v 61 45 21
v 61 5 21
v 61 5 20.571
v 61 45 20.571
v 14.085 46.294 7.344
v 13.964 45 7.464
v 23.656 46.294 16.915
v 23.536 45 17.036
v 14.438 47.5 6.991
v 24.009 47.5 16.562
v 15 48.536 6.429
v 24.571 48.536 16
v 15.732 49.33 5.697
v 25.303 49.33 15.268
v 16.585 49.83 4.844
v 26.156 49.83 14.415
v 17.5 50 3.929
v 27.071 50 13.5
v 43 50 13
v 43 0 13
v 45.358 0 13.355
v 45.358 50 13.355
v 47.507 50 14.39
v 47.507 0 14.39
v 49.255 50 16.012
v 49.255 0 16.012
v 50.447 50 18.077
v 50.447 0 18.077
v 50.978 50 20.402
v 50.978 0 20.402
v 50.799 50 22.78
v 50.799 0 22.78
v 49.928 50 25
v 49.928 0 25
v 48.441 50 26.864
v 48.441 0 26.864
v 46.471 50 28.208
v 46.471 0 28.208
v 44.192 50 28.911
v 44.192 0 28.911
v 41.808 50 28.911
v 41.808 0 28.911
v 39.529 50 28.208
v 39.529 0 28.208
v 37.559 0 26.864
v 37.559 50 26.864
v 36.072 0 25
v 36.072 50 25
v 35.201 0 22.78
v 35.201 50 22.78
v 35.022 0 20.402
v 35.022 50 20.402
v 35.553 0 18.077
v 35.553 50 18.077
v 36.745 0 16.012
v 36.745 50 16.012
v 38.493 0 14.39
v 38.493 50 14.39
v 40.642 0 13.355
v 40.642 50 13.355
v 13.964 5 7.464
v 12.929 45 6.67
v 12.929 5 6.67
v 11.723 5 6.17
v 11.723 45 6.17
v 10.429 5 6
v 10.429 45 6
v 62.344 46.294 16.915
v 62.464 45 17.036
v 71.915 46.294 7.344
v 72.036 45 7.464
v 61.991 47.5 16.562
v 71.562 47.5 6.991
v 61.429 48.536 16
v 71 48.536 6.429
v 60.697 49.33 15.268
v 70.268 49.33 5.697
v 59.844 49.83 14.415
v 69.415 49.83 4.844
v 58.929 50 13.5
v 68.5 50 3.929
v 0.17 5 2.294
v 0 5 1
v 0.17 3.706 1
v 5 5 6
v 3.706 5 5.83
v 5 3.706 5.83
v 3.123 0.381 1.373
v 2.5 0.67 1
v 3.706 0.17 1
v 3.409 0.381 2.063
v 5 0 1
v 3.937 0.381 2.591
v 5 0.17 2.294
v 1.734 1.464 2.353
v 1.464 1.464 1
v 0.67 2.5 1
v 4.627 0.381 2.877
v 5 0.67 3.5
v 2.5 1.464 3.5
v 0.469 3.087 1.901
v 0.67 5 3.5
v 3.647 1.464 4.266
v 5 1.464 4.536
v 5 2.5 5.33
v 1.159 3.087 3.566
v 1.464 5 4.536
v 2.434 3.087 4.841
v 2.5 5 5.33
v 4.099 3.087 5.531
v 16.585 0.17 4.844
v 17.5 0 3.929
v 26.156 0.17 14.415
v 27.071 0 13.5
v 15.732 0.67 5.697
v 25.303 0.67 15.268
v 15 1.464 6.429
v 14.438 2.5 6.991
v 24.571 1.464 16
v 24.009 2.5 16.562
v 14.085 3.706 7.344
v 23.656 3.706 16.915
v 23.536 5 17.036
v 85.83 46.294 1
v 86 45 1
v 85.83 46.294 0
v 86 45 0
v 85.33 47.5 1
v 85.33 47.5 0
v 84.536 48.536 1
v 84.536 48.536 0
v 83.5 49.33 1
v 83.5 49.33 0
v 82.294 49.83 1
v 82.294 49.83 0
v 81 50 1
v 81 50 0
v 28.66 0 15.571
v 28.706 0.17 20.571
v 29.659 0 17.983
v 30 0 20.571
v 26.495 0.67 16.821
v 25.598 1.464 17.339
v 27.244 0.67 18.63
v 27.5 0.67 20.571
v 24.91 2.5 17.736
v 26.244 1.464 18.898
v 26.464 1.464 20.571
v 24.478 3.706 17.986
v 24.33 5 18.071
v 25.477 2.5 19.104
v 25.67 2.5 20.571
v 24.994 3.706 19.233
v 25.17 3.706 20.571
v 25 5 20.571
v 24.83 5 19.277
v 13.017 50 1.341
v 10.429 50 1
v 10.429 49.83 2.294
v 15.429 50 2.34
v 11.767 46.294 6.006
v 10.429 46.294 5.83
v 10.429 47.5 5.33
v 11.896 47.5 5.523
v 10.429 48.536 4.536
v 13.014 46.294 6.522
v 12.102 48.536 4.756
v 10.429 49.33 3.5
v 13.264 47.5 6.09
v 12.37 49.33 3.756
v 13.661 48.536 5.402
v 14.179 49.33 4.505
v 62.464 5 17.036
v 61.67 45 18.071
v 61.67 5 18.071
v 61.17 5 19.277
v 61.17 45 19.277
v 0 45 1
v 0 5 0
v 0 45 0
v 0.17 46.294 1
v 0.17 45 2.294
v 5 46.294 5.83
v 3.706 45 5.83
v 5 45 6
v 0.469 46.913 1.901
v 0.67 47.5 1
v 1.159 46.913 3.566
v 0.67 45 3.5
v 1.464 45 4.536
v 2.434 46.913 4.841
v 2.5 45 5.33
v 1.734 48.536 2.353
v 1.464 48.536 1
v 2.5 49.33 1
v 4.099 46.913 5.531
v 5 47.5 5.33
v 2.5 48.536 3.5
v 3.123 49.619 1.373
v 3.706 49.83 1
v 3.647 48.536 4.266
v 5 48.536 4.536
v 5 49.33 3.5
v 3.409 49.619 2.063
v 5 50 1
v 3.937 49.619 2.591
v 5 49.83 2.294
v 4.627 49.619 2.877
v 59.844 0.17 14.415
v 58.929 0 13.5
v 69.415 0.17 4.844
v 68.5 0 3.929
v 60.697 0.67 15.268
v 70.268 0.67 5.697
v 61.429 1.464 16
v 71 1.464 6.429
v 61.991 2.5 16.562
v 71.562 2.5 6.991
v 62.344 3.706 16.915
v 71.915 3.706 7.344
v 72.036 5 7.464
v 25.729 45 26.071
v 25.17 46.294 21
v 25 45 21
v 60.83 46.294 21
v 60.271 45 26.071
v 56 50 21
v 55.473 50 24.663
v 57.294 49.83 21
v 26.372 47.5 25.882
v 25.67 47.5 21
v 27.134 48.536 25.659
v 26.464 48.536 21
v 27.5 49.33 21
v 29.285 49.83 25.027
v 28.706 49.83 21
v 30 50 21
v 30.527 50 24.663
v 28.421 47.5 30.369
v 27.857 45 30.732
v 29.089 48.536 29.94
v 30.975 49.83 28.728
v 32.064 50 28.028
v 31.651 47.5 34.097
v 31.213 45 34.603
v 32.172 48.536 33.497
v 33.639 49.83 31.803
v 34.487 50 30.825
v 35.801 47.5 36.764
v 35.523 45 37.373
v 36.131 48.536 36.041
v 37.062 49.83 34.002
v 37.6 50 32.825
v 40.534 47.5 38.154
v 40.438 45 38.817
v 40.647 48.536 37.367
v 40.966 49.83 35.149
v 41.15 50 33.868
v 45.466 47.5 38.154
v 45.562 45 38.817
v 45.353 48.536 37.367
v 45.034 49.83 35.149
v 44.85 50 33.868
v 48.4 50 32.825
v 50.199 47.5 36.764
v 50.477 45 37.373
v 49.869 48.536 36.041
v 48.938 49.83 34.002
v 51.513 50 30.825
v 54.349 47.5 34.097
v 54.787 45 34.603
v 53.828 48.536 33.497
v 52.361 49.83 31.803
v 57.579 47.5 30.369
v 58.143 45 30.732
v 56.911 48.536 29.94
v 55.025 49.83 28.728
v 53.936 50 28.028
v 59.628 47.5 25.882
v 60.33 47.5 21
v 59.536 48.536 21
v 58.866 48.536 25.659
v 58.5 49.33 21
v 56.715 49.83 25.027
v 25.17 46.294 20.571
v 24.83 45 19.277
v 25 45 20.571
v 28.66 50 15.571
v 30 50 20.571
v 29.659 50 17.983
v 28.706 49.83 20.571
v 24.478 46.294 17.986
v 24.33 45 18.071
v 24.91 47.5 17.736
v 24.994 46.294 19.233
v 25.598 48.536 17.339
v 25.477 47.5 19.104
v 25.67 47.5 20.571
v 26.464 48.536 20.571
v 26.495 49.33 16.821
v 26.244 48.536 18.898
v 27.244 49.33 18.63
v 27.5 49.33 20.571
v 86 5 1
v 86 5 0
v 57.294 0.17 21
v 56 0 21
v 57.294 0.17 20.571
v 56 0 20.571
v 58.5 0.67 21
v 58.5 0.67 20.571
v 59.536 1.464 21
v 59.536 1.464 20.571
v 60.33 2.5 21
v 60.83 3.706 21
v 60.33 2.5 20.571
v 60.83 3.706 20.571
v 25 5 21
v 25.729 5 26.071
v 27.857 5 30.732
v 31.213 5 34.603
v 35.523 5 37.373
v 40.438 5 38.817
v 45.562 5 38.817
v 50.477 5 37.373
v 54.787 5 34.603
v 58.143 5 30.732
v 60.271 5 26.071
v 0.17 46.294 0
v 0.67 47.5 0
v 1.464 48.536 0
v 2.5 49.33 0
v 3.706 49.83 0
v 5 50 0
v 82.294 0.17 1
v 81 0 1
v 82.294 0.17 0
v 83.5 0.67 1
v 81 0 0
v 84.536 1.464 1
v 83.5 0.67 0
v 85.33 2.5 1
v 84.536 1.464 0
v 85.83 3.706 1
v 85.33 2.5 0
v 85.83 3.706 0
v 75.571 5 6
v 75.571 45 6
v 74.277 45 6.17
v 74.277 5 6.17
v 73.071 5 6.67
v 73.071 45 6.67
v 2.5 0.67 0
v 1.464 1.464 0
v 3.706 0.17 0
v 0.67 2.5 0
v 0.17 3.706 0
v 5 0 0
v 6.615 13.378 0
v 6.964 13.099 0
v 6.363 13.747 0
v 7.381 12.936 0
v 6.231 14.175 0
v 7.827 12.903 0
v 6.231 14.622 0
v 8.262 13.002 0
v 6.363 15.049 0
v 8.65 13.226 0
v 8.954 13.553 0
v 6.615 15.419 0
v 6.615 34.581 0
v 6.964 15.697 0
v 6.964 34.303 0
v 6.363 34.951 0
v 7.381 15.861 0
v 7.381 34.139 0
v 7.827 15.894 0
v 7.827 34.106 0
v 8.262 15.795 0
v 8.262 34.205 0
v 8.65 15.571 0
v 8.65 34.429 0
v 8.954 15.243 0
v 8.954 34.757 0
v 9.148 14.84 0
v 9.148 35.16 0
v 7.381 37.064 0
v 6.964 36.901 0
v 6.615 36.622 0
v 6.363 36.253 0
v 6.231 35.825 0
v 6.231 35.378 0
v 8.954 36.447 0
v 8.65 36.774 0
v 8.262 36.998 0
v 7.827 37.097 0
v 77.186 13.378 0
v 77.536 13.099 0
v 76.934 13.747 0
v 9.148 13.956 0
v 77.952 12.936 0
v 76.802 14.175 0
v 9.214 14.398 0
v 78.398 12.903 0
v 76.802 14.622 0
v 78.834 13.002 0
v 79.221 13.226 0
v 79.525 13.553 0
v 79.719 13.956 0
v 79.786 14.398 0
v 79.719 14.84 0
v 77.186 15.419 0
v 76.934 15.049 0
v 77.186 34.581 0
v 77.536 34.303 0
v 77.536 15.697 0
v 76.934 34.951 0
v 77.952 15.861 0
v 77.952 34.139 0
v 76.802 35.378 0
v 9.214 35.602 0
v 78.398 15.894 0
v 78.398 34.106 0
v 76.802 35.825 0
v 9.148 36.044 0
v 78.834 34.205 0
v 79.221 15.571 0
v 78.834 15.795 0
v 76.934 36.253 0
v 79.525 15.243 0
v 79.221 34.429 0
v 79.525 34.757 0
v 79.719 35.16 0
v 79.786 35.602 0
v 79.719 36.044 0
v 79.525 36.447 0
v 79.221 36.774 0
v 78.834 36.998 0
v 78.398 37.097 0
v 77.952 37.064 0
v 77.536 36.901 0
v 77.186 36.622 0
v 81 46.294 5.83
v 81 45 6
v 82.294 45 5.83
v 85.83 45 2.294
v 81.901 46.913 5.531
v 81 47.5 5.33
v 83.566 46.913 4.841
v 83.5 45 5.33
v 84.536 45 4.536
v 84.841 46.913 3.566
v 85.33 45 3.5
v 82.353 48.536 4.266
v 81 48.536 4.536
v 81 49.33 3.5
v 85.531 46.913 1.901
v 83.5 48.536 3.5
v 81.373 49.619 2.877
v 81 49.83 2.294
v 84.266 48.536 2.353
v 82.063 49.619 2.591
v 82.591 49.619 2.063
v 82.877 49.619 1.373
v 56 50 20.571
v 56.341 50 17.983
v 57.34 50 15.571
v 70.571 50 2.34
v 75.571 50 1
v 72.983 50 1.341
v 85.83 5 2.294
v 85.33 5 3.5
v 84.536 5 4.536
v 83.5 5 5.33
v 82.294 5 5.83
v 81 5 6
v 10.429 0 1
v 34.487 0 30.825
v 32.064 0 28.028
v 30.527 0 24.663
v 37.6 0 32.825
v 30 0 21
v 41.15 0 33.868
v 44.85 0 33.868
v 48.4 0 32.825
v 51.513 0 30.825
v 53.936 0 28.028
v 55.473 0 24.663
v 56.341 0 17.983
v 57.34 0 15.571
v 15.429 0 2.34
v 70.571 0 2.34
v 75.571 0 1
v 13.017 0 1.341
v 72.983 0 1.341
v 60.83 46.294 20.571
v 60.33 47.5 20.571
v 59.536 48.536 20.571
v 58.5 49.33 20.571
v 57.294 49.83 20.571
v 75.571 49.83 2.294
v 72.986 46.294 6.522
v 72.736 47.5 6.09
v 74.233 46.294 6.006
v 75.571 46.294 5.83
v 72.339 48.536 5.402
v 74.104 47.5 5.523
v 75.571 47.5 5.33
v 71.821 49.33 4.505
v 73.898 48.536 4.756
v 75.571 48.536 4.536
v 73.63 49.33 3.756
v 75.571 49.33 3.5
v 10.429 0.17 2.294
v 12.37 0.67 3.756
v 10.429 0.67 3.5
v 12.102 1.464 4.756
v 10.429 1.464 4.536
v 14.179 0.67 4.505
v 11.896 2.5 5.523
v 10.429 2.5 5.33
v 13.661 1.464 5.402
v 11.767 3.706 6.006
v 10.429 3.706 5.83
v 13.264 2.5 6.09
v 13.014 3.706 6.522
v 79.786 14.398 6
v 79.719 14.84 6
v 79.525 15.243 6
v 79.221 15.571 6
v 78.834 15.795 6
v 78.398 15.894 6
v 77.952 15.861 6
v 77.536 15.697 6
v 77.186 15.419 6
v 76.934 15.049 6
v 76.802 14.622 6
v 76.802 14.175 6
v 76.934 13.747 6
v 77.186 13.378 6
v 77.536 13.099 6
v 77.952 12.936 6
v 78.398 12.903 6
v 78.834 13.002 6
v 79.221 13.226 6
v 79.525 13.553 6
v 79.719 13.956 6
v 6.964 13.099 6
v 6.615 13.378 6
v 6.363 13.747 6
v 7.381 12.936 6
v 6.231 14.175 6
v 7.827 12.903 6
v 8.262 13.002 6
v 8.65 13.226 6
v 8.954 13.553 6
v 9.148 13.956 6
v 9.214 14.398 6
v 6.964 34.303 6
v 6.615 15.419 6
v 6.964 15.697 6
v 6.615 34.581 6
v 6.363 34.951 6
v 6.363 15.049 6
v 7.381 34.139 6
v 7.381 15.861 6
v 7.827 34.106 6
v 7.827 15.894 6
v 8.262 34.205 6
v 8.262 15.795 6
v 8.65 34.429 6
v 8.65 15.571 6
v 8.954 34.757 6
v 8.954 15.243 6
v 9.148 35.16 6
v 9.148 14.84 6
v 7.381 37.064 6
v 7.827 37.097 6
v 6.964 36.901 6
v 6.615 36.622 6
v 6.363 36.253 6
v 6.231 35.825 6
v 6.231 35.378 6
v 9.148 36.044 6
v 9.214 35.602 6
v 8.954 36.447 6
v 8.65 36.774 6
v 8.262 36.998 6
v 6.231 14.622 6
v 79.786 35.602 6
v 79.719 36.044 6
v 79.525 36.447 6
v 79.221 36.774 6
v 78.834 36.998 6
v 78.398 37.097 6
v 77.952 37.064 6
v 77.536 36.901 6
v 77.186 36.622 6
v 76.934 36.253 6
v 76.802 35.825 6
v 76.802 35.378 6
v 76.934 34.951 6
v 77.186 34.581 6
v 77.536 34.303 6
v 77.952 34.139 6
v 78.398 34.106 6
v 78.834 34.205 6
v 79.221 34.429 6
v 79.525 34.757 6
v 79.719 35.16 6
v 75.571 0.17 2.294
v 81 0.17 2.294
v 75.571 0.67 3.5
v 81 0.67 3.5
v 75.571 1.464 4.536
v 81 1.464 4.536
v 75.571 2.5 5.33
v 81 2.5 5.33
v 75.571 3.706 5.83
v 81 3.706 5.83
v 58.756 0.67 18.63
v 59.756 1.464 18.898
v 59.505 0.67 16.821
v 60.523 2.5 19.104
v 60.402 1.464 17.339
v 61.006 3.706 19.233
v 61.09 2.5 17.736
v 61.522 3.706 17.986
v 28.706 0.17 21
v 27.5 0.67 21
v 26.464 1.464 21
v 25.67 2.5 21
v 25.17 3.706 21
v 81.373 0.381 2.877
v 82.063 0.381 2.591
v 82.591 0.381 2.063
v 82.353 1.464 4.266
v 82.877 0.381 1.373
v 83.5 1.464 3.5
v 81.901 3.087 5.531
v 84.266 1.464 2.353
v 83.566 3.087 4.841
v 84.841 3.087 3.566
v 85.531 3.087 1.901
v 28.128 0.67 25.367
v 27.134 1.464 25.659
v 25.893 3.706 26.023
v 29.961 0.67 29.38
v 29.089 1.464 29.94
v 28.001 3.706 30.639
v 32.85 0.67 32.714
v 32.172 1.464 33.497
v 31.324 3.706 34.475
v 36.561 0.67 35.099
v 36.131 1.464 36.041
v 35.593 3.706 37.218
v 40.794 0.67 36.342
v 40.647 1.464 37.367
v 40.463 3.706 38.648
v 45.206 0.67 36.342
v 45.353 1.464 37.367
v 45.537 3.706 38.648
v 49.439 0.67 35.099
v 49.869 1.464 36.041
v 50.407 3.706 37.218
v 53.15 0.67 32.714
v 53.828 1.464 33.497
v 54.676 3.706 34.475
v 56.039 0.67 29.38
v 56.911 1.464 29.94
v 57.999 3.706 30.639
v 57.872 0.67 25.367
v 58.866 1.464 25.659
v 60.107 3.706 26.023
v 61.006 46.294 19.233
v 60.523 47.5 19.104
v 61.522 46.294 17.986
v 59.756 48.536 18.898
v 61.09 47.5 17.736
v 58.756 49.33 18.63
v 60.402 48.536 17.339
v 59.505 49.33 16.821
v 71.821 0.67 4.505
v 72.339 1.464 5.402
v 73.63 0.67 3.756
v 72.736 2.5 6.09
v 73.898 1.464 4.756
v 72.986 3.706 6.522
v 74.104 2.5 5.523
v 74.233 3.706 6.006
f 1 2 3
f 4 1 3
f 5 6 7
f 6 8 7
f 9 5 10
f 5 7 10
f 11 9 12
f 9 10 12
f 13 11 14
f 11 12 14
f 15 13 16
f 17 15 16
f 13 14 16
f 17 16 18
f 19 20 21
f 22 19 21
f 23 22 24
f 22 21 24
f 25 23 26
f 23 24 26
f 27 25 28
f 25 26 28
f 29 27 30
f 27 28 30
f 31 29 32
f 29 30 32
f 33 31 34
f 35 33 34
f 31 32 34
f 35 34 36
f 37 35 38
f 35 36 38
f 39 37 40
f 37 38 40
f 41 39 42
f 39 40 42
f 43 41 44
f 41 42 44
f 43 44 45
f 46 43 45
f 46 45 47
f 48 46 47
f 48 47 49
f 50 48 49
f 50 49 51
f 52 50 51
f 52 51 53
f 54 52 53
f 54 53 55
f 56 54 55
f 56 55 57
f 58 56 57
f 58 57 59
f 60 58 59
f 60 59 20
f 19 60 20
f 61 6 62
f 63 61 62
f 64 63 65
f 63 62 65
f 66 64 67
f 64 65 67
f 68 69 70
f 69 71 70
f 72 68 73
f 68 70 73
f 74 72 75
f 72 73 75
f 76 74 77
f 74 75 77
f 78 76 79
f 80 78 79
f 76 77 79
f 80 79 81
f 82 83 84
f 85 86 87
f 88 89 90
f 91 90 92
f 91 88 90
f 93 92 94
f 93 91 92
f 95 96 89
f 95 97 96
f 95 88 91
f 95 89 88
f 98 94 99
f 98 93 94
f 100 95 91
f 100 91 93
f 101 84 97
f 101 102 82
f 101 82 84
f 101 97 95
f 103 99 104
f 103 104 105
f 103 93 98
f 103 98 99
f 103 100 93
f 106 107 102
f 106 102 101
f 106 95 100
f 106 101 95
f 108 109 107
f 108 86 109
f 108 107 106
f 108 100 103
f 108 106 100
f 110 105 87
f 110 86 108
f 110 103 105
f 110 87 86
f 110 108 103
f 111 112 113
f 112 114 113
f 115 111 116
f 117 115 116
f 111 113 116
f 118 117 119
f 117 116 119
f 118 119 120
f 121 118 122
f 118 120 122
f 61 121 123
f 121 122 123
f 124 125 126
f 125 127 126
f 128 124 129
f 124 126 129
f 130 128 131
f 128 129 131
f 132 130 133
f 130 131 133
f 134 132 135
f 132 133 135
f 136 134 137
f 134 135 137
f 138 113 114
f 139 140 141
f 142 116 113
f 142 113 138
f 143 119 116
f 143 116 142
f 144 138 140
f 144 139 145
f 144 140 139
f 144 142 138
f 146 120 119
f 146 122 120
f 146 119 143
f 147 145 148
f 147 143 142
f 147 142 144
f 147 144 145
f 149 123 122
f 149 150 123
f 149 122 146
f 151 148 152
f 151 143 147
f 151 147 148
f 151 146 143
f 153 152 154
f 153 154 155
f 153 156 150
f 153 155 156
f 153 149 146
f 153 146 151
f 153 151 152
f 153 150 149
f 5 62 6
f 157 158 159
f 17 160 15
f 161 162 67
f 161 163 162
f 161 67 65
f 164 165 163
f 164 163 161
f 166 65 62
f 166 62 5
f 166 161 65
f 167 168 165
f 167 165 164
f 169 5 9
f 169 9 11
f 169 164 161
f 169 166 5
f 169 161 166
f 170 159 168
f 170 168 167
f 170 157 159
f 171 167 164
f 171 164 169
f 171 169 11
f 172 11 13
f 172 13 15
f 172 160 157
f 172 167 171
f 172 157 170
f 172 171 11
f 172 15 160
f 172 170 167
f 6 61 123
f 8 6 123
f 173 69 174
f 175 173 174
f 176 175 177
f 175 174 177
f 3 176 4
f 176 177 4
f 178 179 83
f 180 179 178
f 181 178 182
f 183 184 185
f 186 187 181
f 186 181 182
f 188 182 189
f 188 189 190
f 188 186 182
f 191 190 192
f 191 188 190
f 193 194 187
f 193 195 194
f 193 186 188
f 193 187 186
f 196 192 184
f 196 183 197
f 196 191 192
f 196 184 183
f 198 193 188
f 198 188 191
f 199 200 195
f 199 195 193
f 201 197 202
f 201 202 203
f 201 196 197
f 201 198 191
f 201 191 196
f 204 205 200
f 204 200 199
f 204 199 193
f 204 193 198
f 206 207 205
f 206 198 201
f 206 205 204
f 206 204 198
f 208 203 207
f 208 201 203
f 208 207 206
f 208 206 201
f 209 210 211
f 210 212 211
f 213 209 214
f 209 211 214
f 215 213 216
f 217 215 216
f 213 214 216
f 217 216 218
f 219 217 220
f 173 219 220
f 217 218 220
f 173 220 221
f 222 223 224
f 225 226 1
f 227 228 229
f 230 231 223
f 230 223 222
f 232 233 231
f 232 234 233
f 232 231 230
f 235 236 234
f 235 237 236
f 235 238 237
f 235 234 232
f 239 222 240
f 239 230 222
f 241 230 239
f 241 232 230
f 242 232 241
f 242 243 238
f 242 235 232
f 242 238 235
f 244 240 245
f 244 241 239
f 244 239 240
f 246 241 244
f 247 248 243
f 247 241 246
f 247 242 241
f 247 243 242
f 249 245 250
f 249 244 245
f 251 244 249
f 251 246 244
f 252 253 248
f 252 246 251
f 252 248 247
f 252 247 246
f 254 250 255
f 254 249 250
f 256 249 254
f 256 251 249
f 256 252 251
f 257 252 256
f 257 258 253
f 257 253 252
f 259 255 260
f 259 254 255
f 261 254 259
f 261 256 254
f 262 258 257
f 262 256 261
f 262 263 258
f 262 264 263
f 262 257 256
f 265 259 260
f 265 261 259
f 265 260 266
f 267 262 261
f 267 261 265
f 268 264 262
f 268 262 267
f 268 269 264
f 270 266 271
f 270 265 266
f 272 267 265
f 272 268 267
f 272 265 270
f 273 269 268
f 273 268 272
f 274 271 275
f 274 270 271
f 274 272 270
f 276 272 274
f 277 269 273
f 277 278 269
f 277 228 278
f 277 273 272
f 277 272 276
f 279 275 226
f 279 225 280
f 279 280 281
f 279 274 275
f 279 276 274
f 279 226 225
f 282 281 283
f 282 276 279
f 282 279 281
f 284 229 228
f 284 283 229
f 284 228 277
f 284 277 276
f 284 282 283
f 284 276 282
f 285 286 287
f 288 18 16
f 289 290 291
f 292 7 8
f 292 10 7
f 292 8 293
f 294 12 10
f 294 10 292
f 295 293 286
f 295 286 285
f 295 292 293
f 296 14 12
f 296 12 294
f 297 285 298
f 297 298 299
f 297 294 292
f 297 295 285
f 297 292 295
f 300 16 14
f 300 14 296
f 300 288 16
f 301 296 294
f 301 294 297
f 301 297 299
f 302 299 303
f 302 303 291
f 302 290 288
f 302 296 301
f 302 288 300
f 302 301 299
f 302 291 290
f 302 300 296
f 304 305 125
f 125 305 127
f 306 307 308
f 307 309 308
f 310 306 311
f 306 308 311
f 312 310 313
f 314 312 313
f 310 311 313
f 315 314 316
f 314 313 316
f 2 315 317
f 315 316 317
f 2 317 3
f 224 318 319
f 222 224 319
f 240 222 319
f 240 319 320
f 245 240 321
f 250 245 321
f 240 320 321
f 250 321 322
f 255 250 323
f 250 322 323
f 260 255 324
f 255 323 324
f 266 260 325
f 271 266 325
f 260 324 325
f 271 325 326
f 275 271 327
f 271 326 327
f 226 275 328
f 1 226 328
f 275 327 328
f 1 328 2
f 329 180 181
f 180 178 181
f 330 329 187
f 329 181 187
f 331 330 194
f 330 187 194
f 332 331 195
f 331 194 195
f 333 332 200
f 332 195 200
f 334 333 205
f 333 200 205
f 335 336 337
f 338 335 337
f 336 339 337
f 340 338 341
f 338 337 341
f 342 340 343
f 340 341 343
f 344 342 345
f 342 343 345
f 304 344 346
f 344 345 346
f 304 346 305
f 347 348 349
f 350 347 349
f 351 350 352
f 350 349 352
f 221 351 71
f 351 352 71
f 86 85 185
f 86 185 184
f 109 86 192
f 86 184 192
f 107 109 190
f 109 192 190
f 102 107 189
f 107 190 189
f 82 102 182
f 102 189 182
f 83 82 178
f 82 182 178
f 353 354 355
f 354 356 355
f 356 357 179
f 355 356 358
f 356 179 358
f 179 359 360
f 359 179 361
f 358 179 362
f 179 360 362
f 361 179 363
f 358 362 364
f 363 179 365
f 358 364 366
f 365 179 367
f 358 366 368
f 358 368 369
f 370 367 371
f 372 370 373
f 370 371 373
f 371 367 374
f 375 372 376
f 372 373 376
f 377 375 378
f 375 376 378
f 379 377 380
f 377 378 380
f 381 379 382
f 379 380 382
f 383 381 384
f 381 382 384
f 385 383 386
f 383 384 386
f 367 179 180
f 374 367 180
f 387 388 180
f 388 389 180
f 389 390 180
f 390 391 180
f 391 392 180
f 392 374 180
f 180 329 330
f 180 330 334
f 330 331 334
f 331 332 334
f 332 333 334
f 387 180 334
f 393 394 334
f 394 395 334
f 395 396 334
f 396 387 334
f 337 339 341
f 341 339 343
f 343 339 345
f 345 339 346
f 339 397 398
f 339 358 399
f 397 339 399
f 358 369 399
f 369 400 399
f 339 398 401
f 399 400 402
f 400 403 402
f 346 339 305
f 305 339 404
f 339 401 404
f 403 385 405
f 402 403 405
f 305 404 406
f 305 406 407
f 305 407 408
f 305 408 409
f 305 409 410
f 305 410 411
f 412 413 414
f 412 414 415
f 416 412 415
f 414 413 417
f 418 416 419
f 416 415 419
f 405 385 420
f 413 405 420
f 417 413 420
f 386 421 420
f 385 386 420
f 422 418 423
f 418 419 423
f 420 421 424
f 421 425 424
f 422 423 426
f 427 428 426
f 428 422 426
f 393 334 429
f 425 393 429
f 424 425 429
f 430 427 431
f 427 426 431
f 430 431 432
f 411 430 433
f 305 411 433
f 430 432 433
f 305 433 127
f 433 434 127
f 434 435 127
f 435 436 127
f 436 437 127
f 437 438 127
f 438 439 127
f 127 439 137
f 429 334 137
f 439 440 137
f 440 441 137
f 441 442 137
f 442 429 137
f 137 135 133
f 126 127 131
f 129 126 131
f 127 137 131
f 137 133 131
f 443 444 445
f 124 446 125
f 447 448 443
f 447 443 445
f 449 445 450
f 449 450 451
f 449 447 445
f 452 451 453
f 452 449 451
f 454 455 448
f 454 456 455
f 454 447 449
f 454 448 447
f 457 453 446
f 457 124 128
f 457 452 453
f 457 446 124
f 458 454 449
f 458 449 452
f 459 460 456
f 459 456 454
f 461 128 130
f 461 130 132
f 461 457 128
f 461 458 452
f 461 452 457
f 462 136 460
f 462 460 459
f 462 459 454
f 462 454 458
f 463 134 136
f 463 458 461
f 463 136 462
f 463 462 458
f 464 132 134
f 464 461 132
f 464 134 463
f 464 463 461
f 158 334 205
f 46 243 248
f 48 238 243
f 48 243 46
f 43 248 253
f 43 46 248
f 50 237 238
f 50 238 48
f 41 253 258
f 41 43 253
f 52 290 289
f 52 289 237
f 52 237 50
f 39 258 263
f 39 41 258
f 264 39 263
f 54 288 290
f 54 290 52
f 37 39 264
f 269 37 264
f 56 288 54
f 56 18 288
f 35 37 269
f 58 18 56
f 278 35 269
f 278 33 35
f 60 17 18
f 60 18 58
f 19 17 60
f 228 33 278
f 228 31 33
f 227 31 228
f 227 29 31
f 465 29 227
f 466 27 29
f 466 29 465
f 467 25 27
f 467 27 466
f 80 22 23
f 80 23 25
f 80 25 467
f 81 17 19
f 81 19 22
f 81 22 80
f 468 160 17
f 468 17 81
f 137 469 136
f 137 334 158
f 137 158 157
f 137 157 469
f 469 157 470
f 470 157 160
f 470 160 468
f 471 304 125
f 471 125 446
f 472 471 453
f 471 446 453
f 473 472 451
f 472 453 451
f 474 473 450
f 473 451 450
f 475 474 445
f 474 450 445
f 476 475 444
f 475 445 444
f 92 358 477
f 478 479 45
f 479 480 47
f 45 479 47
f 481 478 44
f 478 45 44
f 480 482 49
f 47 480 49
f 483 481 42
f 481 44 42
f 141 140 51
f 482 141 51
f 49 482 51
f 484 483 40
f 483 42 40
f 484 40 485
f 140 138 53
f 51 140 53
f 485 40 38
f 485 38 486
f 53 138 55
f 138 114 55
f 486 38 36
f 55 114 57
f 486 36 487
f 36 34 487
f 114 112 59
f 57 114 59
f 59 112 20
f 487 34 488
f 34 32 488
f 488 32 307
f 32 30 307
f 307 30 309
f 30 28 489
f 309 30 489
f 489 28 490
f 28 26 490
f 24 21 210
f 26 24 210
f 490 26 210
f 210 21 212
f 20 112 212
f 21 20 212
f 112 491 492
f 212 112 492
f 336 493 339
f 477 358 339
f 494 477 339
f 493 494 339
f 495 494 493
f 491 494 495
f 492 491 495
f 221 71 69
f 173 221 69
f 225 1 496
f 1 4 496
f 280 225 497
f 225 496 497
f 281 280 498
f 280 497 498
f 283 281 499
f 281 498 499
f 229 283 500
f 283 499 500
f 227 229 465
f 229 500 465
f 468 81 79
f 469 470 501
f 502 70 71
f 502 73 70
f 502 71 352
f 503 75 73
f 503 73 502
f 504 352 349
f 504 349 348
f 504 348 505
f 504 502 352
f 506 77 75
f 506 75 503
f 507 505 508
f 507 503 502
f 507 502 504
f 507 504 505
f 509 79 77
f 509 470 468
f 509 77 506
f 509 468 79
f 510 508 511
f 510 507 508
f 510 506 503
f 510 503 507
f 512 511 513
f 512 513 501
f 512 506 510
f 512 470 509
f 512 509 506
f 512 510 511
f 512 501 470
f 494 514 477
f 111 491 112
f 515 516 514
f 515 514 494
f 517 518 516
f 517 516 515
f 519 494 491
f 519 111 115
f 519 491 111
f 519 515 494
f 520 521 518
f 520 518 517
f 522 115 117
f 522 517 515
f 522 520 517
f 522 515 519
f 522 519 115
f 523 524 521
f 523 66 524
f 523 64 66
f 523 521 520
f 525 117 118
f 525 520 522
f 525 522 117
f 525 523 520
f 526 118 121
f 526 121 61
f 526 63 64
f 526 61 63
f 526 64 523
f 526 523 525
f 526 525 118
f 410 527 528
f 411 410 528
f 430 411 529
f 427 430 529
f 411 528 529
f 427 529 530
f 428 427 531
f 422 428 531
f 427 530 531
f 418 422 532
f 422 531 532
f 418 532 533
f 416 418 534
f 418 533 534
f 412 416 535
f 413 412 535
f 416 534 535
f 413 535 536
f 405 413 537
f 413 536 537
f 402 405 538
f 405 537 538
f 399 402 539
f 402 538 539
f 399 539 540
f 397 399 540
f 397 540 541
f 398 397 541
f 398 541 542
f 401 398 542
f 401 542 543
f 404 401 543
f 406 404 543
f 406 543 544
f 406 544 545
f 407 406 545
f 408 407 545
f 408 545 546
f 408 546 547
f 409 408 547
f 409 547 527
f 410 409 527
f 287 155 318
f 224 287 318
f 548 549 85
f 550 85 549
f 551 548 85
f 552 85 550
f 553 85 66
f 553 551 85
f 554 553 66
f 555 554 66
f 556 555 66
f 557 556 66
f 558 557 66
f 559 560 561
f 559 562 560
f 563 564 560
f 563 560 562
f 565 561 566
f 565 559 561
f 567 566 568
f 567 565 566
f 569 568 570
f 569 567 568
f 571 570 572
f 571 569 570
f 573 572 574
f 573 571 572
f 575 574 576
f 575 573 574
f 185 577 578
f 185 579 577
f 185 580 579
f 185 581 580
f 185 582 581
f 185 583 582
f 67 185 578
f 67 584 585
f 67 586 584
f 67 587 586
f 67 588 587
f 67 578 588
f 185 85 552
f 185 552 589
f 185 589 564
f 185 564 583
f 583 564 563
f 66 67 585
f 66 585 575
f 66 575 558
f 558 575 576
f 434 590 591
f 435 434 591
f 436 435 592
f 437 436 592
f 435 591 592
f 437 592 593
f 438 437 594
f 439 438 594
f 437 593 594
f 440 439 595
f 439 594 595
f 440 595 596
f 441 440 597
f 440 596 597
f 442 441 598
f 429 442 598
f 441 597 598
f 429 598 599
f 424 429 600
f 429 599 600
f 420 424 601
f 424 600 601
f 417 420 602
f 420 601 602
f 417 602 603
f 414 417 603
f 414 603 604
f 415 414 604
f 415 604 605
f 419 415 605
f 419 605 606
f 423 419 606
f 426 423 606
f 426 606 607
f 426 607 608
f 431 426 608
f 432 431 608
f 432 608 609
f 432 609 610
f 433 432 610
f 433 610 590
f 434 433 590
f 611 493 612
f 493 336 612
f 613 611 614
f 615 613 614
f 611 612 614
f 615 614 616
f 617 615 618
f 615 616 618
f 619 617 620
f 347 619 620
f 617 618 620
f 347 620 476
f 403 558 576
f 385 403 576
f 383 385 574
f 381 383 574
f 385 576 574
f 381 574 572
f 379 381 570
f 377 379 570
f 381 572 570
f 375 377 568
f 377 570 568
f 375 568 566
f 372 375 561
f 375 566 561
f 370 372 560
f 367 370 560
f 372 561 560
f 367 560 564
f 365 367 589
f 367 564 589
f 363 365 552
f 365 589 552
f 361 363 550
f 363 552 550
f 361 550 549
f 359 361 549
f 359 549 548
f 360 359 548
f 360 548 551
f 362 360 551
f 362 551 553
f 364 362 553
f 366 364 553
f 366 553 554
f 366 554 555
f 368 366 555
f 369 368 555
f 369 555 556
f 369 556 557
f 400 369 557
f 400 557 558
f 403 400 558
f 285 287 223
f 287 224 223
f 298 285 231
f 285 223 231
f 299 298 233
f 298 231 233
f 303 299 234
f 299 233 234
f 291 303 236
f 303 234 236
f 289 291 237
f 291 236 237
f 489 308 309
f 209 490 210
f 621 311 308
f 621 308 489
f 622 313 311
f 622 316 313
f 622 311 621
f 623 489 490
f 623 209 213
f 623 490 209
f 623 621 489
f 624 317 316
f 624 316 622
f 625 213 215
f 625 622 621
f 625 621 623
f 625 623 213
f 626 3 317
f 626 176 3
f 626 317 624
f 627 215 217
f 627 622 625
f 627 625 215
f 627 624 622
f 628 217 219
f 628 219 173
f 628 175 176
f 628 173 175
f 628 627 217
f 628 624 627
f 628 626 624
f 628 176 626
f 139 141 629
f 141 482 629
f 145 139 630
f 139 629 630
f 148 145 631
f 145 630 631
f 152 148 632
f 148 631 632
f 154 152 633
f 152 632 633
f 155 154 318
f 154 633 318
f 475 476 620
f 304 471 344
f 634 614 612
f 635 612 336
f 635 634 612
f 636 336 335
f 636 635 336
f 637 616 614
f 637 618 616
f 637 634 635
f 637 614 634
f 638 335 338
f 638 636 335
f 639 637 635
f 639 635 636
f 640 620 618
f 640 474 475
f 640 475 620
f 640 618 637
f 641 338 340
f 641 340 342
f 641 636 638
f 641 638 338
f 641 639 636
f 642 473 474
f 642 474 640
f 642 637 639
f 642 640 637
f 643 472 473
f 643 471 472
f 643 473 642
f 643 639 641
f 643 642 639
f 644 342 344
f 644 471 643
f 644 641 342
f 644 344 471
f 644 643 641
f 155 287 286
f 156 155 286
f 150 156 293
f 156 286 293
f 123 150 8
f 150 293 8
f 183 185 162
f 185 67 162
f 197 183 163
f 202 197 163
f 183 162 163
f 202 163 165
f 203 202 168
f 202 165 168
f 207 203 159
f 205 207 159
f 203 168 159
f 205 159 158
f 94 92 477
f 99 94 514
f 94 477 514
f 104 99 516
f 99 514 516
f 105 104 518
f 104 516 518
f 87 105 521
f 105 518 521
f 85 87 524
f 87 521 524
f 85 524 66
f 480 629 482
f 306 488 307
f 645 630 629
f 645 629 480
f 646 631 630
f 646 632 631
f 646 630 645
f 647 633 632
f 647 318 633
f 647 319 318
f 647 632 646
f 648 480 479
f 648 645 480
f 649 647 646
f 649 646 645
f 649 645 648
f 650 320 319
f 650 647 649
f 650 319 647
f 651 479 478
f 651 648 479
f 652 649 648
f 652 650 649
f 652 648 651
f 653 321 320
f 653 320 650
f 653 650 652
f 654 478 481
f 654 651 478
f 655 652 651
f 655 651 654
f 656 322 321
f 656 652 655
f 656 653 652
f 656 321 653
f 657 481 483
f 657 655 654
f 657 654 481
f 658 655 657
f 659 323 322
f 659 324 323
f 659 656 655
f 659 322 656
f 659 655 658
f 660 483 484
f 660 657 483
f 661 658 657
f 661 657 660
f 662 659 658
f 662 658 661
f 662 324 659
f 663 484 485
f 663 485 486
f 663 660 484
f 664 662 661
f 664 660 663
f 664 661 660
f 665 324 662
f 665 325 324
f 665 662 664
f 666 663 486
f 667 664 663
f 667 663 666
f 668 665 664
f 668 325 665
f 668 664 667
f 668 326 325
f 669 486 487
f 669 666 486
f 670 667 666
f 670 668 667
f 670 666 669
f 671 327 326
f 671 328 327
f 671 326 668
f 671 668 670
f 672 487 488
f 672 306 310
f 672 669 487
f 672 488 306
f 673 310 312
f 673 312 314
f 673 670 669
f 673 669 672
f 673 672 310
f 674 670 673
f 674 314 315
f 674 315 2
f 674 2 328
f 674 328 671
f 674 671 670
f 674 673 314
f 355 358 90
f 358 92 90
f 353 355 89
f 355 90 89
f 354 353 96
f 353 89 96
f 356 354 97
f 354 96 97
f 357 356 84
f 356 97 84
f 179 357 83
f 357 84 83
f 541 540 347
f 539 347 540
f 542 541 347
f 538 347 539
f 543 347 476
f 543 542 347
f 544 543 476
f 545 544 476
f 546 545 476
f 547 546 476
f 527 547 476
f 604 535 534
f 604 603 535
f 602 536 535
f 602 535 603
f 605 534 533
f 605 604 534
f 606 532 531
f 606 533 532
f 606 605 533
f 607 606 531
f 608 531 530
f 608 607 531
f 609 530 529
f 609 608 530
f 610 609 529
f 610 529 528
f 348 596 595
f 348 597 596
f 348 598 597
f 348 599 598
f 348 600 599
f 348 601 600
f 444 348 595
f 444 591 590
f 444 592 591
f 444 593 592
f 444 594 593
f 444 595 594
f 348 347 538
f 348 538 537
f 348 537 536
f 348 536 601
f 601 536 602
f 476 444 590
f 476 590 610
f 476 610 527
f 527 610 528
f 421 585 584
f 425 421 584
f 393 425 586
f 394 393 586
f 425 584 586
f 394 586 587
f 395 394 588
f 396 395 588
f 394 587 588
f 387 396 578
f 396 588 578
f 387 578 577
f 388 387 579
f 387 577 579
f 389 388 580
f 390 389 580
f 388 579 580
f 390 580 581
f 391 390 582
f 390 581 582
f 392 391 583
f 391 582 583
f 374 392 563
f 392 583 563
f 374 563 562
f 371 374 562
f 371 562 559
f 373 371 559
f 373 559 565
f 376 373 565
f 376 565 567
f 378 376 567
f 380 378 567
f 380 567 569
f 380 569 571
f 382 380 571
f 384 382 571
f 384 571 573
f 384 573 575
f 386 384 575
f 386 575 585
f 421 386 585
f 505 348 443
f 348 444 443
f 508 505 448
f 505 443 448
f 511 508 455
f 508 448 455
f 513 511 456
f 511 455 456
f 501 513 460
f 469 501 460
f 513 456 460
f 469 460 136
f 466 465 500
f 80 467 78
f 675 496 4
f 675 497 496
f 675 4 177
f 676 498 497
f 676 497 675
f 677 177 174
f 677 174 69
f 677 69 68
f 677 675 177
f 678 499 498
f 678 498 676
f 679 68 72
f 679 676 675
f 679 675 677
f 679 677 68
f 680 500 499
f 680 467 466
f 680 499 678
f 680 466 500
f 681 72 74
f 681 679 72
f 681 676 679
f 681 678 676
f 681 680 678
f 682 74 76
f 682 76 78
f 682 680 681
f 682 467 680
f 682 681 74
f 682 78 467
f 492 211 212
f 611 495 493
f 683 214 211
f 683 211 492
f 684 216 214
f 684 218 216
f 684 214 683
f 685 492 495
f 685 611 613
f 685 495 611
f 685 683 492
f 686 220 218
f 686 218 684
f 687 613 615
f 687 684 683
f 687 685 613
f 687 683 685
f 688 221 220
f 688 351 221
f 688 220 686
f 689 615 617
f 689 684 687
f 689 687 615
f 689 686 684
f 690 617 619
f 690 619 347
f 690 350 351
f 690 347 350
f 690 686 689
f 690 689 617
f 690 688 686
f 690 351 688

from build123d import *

# Parameters (mm, degrees)
SKETCH1_W           = 86
SKETCH1_H           = 50
BOSS_EXTRUDE2_DEPTH = 6
BOSS_EXTRUDE3_DEPTH = 50
SKETCH4_R           = 8
CUT_EXTRUDE1_DEPTH  = 121
BOSS_EXTRUDE5_DEPTH = 50
BOSS_EXTRUDE6_DEPTH = 50
FILLET1_R           = 5
FILLET2_R           = 5
FILLET3_R           = 5
FILLET4_R           = 5
FILLET5_R           = 5
SKETCH7_R           = 1.5
CUT_EXTRUDE2_DEPTH  = 50
SKETCH8_R           = 1.5
CUT_EXTRUDE4_DEPTH  = 50


with BuildPart() as part:
    # Sketch1 → Boss-Extrude2 (new body)
    with BuildSketch(Plane.XY):
        with Locations((43, 25)):
            Rectangle(SKETCH1_W, SKETCH1_H)
    extrude(amount=BOSS_EXTRUDE2_DEPTH)

    # Sketch2 → Boss-Extrude3 (add)
    with BuildSketch(Plane(origin=(0, 0, 0), x_dir=(-1, 0, 0), z_dir=(0, -1, 0))):
        with BuildLine():
            Line((-61, -21), (-61, -6))
            Line((-61, -6), (-25, -6))
            Line((-25, -6), (-25, -21))
            ThreePointArc((-25, -21), (-43, -39), (-61, -21))
        make_face()
    extrude(amount=-BOSS_EXTRUDE3_DEPTH)

    # Sketch4 → Cut-Extrude1 (cut)
    with BuildSketch(Plane(origin=(0, 0, 0), x_dir=(-1, 0, 0), z_dir=(0, -1, 0))):
        with Locations(Location((-43, -21, 0), (0, 0, 90))):
            Circle(SKETCH4_R)
    extrude(amount=-CUT_EXTRUDE1_DEPTH, mode=Mode.SUBTRACT)

    # Sketch5 → Boss-Extrude5 (add)
    with BuildSketch(Plane(origin=(0, 0, 0), x_dir=(-1, 0, 0), z_dir=(0, -1, 0))):
        Polygon((-61, -6), (-73.5, -6), (-61, -18.5), align=None)
    extrude(amount=-BOSS_EXTRUDE5_DEPTH)

    # Sketch6 → Boss-Extrude6 (add)
    with BuildSketch(Plane(origin=(0, 0, 0), x_dir=(-1, 0, 0), z_dir=(0, -1, 0))):
        Polygon((-25, -6), (-12.5, -6), (-25, -18.5), align=None)
    extrude(amount=-BOSS_EXTRUDE6_DEPTH)

    # Fillet1
    fillet1_edges = [part.edges().sort_by_distance(p)[0] for p in [
        (86, 25, 6),
    ]]
    fillet(fillet1_edges, radius=FILLET1_R)

    # Fillet2
    fillet2_edges = [part.edges().sort_by_distance(p)[0] for p in [
        (73.5, 25, 6),
    ]]
    fillet(fillet2_edges, radius=FILLET2_R)

    # Fillet3
    fillet3_edges = [part.edges().sort_by_distance(p)[0] for p in [
        (61, 25, 18.5),
    ]]
    fillet(fillet3_edges, radius=FILLET3_R)

    # Fillet4
    fillet4_edges = [part.edges().sort_by_distance(p)[0] for p in [
        (25, 25, 18.5),
        (0, 25, 6),
        (12.5, 25, 6),
    ]]
    fillet(fillet4_edges, radius=FILLET4_R)

    # Fillet5
    fillet5_edges = [part.edges().sort_by_distance(p)[0] for p in [
        (43, 0, 39),
        (61, 0, 20.785533906),
        (43, 50, 39),
        (61, 50, 20.785533906),
        (78.285533906, 50, 6),
        (86, 50, 0.5),
        (84.535533906, 50, 4.535533906),
        (86, 0, 0.5),
        (84.535533906, 0, 4.535533906),
        (78.285533906, 0, 6),
        (67.25, 0, 12.25),
        (67.25, 50, 12.25),
        (73.65765065, 0, 6.380602337),
        (73.65765065, 50, 6.380602337),
        (61.380602337, 0, 18.65765065),
        (61.380602337, 50, 18.65765065),
        (18.75, 0, 12.25),
        (18.75, 50, 12.25),
        (7.714466094, 50, 6),
        (7.714466094, 0, 6),
        (25, 50, 20.785533906),
        (25, 0, 20.785533906),
        (0, 0, 0.5),
        (1.464466094, 0, 4.535533906),
        (0, 50, 0.5),
        (1.464466094, 50, 4.535533906),
        (12.34234935, 0, 6.380602337),
        (12.34234935, 50, 6.380602337),
        (24.619397663, 0, 18.65765065),
        (24.619397663, 50, 18.65765065),
    ]]
    fillet(fillet5_edges, radius=FILLET5_R)

    # Sketch7 → Cut-Extrude2 (cut)
    with BuildSketch(Plane.XY.offset(6)):
        with Locations((7.714466094, 35.601677871)):
            Circle(SKETCH7_R)
        with Locations((7.714466094, 14.398322129)):
            Circle(SKETCH7_R)
    extrude(amount=-CUT_EXTRUDE2_DEPTH, mode=Mode.SUBTRACT)

    # Sketch8 → Cut-Extrude4 (cut)
    with BuildSketch(Plane.XY.offset(6)):
        with Locations((78.285533906, 35.60168)):
            Circle(SKETCH8_R)
        with Locations((78.285533906, 14.39832)):
            Circle(SKETCH8_R)
    extrude(amount=-CUT_EXTRUDE4_DEPTH, mode=Mode.SUBTRACT)


solid = part.part
